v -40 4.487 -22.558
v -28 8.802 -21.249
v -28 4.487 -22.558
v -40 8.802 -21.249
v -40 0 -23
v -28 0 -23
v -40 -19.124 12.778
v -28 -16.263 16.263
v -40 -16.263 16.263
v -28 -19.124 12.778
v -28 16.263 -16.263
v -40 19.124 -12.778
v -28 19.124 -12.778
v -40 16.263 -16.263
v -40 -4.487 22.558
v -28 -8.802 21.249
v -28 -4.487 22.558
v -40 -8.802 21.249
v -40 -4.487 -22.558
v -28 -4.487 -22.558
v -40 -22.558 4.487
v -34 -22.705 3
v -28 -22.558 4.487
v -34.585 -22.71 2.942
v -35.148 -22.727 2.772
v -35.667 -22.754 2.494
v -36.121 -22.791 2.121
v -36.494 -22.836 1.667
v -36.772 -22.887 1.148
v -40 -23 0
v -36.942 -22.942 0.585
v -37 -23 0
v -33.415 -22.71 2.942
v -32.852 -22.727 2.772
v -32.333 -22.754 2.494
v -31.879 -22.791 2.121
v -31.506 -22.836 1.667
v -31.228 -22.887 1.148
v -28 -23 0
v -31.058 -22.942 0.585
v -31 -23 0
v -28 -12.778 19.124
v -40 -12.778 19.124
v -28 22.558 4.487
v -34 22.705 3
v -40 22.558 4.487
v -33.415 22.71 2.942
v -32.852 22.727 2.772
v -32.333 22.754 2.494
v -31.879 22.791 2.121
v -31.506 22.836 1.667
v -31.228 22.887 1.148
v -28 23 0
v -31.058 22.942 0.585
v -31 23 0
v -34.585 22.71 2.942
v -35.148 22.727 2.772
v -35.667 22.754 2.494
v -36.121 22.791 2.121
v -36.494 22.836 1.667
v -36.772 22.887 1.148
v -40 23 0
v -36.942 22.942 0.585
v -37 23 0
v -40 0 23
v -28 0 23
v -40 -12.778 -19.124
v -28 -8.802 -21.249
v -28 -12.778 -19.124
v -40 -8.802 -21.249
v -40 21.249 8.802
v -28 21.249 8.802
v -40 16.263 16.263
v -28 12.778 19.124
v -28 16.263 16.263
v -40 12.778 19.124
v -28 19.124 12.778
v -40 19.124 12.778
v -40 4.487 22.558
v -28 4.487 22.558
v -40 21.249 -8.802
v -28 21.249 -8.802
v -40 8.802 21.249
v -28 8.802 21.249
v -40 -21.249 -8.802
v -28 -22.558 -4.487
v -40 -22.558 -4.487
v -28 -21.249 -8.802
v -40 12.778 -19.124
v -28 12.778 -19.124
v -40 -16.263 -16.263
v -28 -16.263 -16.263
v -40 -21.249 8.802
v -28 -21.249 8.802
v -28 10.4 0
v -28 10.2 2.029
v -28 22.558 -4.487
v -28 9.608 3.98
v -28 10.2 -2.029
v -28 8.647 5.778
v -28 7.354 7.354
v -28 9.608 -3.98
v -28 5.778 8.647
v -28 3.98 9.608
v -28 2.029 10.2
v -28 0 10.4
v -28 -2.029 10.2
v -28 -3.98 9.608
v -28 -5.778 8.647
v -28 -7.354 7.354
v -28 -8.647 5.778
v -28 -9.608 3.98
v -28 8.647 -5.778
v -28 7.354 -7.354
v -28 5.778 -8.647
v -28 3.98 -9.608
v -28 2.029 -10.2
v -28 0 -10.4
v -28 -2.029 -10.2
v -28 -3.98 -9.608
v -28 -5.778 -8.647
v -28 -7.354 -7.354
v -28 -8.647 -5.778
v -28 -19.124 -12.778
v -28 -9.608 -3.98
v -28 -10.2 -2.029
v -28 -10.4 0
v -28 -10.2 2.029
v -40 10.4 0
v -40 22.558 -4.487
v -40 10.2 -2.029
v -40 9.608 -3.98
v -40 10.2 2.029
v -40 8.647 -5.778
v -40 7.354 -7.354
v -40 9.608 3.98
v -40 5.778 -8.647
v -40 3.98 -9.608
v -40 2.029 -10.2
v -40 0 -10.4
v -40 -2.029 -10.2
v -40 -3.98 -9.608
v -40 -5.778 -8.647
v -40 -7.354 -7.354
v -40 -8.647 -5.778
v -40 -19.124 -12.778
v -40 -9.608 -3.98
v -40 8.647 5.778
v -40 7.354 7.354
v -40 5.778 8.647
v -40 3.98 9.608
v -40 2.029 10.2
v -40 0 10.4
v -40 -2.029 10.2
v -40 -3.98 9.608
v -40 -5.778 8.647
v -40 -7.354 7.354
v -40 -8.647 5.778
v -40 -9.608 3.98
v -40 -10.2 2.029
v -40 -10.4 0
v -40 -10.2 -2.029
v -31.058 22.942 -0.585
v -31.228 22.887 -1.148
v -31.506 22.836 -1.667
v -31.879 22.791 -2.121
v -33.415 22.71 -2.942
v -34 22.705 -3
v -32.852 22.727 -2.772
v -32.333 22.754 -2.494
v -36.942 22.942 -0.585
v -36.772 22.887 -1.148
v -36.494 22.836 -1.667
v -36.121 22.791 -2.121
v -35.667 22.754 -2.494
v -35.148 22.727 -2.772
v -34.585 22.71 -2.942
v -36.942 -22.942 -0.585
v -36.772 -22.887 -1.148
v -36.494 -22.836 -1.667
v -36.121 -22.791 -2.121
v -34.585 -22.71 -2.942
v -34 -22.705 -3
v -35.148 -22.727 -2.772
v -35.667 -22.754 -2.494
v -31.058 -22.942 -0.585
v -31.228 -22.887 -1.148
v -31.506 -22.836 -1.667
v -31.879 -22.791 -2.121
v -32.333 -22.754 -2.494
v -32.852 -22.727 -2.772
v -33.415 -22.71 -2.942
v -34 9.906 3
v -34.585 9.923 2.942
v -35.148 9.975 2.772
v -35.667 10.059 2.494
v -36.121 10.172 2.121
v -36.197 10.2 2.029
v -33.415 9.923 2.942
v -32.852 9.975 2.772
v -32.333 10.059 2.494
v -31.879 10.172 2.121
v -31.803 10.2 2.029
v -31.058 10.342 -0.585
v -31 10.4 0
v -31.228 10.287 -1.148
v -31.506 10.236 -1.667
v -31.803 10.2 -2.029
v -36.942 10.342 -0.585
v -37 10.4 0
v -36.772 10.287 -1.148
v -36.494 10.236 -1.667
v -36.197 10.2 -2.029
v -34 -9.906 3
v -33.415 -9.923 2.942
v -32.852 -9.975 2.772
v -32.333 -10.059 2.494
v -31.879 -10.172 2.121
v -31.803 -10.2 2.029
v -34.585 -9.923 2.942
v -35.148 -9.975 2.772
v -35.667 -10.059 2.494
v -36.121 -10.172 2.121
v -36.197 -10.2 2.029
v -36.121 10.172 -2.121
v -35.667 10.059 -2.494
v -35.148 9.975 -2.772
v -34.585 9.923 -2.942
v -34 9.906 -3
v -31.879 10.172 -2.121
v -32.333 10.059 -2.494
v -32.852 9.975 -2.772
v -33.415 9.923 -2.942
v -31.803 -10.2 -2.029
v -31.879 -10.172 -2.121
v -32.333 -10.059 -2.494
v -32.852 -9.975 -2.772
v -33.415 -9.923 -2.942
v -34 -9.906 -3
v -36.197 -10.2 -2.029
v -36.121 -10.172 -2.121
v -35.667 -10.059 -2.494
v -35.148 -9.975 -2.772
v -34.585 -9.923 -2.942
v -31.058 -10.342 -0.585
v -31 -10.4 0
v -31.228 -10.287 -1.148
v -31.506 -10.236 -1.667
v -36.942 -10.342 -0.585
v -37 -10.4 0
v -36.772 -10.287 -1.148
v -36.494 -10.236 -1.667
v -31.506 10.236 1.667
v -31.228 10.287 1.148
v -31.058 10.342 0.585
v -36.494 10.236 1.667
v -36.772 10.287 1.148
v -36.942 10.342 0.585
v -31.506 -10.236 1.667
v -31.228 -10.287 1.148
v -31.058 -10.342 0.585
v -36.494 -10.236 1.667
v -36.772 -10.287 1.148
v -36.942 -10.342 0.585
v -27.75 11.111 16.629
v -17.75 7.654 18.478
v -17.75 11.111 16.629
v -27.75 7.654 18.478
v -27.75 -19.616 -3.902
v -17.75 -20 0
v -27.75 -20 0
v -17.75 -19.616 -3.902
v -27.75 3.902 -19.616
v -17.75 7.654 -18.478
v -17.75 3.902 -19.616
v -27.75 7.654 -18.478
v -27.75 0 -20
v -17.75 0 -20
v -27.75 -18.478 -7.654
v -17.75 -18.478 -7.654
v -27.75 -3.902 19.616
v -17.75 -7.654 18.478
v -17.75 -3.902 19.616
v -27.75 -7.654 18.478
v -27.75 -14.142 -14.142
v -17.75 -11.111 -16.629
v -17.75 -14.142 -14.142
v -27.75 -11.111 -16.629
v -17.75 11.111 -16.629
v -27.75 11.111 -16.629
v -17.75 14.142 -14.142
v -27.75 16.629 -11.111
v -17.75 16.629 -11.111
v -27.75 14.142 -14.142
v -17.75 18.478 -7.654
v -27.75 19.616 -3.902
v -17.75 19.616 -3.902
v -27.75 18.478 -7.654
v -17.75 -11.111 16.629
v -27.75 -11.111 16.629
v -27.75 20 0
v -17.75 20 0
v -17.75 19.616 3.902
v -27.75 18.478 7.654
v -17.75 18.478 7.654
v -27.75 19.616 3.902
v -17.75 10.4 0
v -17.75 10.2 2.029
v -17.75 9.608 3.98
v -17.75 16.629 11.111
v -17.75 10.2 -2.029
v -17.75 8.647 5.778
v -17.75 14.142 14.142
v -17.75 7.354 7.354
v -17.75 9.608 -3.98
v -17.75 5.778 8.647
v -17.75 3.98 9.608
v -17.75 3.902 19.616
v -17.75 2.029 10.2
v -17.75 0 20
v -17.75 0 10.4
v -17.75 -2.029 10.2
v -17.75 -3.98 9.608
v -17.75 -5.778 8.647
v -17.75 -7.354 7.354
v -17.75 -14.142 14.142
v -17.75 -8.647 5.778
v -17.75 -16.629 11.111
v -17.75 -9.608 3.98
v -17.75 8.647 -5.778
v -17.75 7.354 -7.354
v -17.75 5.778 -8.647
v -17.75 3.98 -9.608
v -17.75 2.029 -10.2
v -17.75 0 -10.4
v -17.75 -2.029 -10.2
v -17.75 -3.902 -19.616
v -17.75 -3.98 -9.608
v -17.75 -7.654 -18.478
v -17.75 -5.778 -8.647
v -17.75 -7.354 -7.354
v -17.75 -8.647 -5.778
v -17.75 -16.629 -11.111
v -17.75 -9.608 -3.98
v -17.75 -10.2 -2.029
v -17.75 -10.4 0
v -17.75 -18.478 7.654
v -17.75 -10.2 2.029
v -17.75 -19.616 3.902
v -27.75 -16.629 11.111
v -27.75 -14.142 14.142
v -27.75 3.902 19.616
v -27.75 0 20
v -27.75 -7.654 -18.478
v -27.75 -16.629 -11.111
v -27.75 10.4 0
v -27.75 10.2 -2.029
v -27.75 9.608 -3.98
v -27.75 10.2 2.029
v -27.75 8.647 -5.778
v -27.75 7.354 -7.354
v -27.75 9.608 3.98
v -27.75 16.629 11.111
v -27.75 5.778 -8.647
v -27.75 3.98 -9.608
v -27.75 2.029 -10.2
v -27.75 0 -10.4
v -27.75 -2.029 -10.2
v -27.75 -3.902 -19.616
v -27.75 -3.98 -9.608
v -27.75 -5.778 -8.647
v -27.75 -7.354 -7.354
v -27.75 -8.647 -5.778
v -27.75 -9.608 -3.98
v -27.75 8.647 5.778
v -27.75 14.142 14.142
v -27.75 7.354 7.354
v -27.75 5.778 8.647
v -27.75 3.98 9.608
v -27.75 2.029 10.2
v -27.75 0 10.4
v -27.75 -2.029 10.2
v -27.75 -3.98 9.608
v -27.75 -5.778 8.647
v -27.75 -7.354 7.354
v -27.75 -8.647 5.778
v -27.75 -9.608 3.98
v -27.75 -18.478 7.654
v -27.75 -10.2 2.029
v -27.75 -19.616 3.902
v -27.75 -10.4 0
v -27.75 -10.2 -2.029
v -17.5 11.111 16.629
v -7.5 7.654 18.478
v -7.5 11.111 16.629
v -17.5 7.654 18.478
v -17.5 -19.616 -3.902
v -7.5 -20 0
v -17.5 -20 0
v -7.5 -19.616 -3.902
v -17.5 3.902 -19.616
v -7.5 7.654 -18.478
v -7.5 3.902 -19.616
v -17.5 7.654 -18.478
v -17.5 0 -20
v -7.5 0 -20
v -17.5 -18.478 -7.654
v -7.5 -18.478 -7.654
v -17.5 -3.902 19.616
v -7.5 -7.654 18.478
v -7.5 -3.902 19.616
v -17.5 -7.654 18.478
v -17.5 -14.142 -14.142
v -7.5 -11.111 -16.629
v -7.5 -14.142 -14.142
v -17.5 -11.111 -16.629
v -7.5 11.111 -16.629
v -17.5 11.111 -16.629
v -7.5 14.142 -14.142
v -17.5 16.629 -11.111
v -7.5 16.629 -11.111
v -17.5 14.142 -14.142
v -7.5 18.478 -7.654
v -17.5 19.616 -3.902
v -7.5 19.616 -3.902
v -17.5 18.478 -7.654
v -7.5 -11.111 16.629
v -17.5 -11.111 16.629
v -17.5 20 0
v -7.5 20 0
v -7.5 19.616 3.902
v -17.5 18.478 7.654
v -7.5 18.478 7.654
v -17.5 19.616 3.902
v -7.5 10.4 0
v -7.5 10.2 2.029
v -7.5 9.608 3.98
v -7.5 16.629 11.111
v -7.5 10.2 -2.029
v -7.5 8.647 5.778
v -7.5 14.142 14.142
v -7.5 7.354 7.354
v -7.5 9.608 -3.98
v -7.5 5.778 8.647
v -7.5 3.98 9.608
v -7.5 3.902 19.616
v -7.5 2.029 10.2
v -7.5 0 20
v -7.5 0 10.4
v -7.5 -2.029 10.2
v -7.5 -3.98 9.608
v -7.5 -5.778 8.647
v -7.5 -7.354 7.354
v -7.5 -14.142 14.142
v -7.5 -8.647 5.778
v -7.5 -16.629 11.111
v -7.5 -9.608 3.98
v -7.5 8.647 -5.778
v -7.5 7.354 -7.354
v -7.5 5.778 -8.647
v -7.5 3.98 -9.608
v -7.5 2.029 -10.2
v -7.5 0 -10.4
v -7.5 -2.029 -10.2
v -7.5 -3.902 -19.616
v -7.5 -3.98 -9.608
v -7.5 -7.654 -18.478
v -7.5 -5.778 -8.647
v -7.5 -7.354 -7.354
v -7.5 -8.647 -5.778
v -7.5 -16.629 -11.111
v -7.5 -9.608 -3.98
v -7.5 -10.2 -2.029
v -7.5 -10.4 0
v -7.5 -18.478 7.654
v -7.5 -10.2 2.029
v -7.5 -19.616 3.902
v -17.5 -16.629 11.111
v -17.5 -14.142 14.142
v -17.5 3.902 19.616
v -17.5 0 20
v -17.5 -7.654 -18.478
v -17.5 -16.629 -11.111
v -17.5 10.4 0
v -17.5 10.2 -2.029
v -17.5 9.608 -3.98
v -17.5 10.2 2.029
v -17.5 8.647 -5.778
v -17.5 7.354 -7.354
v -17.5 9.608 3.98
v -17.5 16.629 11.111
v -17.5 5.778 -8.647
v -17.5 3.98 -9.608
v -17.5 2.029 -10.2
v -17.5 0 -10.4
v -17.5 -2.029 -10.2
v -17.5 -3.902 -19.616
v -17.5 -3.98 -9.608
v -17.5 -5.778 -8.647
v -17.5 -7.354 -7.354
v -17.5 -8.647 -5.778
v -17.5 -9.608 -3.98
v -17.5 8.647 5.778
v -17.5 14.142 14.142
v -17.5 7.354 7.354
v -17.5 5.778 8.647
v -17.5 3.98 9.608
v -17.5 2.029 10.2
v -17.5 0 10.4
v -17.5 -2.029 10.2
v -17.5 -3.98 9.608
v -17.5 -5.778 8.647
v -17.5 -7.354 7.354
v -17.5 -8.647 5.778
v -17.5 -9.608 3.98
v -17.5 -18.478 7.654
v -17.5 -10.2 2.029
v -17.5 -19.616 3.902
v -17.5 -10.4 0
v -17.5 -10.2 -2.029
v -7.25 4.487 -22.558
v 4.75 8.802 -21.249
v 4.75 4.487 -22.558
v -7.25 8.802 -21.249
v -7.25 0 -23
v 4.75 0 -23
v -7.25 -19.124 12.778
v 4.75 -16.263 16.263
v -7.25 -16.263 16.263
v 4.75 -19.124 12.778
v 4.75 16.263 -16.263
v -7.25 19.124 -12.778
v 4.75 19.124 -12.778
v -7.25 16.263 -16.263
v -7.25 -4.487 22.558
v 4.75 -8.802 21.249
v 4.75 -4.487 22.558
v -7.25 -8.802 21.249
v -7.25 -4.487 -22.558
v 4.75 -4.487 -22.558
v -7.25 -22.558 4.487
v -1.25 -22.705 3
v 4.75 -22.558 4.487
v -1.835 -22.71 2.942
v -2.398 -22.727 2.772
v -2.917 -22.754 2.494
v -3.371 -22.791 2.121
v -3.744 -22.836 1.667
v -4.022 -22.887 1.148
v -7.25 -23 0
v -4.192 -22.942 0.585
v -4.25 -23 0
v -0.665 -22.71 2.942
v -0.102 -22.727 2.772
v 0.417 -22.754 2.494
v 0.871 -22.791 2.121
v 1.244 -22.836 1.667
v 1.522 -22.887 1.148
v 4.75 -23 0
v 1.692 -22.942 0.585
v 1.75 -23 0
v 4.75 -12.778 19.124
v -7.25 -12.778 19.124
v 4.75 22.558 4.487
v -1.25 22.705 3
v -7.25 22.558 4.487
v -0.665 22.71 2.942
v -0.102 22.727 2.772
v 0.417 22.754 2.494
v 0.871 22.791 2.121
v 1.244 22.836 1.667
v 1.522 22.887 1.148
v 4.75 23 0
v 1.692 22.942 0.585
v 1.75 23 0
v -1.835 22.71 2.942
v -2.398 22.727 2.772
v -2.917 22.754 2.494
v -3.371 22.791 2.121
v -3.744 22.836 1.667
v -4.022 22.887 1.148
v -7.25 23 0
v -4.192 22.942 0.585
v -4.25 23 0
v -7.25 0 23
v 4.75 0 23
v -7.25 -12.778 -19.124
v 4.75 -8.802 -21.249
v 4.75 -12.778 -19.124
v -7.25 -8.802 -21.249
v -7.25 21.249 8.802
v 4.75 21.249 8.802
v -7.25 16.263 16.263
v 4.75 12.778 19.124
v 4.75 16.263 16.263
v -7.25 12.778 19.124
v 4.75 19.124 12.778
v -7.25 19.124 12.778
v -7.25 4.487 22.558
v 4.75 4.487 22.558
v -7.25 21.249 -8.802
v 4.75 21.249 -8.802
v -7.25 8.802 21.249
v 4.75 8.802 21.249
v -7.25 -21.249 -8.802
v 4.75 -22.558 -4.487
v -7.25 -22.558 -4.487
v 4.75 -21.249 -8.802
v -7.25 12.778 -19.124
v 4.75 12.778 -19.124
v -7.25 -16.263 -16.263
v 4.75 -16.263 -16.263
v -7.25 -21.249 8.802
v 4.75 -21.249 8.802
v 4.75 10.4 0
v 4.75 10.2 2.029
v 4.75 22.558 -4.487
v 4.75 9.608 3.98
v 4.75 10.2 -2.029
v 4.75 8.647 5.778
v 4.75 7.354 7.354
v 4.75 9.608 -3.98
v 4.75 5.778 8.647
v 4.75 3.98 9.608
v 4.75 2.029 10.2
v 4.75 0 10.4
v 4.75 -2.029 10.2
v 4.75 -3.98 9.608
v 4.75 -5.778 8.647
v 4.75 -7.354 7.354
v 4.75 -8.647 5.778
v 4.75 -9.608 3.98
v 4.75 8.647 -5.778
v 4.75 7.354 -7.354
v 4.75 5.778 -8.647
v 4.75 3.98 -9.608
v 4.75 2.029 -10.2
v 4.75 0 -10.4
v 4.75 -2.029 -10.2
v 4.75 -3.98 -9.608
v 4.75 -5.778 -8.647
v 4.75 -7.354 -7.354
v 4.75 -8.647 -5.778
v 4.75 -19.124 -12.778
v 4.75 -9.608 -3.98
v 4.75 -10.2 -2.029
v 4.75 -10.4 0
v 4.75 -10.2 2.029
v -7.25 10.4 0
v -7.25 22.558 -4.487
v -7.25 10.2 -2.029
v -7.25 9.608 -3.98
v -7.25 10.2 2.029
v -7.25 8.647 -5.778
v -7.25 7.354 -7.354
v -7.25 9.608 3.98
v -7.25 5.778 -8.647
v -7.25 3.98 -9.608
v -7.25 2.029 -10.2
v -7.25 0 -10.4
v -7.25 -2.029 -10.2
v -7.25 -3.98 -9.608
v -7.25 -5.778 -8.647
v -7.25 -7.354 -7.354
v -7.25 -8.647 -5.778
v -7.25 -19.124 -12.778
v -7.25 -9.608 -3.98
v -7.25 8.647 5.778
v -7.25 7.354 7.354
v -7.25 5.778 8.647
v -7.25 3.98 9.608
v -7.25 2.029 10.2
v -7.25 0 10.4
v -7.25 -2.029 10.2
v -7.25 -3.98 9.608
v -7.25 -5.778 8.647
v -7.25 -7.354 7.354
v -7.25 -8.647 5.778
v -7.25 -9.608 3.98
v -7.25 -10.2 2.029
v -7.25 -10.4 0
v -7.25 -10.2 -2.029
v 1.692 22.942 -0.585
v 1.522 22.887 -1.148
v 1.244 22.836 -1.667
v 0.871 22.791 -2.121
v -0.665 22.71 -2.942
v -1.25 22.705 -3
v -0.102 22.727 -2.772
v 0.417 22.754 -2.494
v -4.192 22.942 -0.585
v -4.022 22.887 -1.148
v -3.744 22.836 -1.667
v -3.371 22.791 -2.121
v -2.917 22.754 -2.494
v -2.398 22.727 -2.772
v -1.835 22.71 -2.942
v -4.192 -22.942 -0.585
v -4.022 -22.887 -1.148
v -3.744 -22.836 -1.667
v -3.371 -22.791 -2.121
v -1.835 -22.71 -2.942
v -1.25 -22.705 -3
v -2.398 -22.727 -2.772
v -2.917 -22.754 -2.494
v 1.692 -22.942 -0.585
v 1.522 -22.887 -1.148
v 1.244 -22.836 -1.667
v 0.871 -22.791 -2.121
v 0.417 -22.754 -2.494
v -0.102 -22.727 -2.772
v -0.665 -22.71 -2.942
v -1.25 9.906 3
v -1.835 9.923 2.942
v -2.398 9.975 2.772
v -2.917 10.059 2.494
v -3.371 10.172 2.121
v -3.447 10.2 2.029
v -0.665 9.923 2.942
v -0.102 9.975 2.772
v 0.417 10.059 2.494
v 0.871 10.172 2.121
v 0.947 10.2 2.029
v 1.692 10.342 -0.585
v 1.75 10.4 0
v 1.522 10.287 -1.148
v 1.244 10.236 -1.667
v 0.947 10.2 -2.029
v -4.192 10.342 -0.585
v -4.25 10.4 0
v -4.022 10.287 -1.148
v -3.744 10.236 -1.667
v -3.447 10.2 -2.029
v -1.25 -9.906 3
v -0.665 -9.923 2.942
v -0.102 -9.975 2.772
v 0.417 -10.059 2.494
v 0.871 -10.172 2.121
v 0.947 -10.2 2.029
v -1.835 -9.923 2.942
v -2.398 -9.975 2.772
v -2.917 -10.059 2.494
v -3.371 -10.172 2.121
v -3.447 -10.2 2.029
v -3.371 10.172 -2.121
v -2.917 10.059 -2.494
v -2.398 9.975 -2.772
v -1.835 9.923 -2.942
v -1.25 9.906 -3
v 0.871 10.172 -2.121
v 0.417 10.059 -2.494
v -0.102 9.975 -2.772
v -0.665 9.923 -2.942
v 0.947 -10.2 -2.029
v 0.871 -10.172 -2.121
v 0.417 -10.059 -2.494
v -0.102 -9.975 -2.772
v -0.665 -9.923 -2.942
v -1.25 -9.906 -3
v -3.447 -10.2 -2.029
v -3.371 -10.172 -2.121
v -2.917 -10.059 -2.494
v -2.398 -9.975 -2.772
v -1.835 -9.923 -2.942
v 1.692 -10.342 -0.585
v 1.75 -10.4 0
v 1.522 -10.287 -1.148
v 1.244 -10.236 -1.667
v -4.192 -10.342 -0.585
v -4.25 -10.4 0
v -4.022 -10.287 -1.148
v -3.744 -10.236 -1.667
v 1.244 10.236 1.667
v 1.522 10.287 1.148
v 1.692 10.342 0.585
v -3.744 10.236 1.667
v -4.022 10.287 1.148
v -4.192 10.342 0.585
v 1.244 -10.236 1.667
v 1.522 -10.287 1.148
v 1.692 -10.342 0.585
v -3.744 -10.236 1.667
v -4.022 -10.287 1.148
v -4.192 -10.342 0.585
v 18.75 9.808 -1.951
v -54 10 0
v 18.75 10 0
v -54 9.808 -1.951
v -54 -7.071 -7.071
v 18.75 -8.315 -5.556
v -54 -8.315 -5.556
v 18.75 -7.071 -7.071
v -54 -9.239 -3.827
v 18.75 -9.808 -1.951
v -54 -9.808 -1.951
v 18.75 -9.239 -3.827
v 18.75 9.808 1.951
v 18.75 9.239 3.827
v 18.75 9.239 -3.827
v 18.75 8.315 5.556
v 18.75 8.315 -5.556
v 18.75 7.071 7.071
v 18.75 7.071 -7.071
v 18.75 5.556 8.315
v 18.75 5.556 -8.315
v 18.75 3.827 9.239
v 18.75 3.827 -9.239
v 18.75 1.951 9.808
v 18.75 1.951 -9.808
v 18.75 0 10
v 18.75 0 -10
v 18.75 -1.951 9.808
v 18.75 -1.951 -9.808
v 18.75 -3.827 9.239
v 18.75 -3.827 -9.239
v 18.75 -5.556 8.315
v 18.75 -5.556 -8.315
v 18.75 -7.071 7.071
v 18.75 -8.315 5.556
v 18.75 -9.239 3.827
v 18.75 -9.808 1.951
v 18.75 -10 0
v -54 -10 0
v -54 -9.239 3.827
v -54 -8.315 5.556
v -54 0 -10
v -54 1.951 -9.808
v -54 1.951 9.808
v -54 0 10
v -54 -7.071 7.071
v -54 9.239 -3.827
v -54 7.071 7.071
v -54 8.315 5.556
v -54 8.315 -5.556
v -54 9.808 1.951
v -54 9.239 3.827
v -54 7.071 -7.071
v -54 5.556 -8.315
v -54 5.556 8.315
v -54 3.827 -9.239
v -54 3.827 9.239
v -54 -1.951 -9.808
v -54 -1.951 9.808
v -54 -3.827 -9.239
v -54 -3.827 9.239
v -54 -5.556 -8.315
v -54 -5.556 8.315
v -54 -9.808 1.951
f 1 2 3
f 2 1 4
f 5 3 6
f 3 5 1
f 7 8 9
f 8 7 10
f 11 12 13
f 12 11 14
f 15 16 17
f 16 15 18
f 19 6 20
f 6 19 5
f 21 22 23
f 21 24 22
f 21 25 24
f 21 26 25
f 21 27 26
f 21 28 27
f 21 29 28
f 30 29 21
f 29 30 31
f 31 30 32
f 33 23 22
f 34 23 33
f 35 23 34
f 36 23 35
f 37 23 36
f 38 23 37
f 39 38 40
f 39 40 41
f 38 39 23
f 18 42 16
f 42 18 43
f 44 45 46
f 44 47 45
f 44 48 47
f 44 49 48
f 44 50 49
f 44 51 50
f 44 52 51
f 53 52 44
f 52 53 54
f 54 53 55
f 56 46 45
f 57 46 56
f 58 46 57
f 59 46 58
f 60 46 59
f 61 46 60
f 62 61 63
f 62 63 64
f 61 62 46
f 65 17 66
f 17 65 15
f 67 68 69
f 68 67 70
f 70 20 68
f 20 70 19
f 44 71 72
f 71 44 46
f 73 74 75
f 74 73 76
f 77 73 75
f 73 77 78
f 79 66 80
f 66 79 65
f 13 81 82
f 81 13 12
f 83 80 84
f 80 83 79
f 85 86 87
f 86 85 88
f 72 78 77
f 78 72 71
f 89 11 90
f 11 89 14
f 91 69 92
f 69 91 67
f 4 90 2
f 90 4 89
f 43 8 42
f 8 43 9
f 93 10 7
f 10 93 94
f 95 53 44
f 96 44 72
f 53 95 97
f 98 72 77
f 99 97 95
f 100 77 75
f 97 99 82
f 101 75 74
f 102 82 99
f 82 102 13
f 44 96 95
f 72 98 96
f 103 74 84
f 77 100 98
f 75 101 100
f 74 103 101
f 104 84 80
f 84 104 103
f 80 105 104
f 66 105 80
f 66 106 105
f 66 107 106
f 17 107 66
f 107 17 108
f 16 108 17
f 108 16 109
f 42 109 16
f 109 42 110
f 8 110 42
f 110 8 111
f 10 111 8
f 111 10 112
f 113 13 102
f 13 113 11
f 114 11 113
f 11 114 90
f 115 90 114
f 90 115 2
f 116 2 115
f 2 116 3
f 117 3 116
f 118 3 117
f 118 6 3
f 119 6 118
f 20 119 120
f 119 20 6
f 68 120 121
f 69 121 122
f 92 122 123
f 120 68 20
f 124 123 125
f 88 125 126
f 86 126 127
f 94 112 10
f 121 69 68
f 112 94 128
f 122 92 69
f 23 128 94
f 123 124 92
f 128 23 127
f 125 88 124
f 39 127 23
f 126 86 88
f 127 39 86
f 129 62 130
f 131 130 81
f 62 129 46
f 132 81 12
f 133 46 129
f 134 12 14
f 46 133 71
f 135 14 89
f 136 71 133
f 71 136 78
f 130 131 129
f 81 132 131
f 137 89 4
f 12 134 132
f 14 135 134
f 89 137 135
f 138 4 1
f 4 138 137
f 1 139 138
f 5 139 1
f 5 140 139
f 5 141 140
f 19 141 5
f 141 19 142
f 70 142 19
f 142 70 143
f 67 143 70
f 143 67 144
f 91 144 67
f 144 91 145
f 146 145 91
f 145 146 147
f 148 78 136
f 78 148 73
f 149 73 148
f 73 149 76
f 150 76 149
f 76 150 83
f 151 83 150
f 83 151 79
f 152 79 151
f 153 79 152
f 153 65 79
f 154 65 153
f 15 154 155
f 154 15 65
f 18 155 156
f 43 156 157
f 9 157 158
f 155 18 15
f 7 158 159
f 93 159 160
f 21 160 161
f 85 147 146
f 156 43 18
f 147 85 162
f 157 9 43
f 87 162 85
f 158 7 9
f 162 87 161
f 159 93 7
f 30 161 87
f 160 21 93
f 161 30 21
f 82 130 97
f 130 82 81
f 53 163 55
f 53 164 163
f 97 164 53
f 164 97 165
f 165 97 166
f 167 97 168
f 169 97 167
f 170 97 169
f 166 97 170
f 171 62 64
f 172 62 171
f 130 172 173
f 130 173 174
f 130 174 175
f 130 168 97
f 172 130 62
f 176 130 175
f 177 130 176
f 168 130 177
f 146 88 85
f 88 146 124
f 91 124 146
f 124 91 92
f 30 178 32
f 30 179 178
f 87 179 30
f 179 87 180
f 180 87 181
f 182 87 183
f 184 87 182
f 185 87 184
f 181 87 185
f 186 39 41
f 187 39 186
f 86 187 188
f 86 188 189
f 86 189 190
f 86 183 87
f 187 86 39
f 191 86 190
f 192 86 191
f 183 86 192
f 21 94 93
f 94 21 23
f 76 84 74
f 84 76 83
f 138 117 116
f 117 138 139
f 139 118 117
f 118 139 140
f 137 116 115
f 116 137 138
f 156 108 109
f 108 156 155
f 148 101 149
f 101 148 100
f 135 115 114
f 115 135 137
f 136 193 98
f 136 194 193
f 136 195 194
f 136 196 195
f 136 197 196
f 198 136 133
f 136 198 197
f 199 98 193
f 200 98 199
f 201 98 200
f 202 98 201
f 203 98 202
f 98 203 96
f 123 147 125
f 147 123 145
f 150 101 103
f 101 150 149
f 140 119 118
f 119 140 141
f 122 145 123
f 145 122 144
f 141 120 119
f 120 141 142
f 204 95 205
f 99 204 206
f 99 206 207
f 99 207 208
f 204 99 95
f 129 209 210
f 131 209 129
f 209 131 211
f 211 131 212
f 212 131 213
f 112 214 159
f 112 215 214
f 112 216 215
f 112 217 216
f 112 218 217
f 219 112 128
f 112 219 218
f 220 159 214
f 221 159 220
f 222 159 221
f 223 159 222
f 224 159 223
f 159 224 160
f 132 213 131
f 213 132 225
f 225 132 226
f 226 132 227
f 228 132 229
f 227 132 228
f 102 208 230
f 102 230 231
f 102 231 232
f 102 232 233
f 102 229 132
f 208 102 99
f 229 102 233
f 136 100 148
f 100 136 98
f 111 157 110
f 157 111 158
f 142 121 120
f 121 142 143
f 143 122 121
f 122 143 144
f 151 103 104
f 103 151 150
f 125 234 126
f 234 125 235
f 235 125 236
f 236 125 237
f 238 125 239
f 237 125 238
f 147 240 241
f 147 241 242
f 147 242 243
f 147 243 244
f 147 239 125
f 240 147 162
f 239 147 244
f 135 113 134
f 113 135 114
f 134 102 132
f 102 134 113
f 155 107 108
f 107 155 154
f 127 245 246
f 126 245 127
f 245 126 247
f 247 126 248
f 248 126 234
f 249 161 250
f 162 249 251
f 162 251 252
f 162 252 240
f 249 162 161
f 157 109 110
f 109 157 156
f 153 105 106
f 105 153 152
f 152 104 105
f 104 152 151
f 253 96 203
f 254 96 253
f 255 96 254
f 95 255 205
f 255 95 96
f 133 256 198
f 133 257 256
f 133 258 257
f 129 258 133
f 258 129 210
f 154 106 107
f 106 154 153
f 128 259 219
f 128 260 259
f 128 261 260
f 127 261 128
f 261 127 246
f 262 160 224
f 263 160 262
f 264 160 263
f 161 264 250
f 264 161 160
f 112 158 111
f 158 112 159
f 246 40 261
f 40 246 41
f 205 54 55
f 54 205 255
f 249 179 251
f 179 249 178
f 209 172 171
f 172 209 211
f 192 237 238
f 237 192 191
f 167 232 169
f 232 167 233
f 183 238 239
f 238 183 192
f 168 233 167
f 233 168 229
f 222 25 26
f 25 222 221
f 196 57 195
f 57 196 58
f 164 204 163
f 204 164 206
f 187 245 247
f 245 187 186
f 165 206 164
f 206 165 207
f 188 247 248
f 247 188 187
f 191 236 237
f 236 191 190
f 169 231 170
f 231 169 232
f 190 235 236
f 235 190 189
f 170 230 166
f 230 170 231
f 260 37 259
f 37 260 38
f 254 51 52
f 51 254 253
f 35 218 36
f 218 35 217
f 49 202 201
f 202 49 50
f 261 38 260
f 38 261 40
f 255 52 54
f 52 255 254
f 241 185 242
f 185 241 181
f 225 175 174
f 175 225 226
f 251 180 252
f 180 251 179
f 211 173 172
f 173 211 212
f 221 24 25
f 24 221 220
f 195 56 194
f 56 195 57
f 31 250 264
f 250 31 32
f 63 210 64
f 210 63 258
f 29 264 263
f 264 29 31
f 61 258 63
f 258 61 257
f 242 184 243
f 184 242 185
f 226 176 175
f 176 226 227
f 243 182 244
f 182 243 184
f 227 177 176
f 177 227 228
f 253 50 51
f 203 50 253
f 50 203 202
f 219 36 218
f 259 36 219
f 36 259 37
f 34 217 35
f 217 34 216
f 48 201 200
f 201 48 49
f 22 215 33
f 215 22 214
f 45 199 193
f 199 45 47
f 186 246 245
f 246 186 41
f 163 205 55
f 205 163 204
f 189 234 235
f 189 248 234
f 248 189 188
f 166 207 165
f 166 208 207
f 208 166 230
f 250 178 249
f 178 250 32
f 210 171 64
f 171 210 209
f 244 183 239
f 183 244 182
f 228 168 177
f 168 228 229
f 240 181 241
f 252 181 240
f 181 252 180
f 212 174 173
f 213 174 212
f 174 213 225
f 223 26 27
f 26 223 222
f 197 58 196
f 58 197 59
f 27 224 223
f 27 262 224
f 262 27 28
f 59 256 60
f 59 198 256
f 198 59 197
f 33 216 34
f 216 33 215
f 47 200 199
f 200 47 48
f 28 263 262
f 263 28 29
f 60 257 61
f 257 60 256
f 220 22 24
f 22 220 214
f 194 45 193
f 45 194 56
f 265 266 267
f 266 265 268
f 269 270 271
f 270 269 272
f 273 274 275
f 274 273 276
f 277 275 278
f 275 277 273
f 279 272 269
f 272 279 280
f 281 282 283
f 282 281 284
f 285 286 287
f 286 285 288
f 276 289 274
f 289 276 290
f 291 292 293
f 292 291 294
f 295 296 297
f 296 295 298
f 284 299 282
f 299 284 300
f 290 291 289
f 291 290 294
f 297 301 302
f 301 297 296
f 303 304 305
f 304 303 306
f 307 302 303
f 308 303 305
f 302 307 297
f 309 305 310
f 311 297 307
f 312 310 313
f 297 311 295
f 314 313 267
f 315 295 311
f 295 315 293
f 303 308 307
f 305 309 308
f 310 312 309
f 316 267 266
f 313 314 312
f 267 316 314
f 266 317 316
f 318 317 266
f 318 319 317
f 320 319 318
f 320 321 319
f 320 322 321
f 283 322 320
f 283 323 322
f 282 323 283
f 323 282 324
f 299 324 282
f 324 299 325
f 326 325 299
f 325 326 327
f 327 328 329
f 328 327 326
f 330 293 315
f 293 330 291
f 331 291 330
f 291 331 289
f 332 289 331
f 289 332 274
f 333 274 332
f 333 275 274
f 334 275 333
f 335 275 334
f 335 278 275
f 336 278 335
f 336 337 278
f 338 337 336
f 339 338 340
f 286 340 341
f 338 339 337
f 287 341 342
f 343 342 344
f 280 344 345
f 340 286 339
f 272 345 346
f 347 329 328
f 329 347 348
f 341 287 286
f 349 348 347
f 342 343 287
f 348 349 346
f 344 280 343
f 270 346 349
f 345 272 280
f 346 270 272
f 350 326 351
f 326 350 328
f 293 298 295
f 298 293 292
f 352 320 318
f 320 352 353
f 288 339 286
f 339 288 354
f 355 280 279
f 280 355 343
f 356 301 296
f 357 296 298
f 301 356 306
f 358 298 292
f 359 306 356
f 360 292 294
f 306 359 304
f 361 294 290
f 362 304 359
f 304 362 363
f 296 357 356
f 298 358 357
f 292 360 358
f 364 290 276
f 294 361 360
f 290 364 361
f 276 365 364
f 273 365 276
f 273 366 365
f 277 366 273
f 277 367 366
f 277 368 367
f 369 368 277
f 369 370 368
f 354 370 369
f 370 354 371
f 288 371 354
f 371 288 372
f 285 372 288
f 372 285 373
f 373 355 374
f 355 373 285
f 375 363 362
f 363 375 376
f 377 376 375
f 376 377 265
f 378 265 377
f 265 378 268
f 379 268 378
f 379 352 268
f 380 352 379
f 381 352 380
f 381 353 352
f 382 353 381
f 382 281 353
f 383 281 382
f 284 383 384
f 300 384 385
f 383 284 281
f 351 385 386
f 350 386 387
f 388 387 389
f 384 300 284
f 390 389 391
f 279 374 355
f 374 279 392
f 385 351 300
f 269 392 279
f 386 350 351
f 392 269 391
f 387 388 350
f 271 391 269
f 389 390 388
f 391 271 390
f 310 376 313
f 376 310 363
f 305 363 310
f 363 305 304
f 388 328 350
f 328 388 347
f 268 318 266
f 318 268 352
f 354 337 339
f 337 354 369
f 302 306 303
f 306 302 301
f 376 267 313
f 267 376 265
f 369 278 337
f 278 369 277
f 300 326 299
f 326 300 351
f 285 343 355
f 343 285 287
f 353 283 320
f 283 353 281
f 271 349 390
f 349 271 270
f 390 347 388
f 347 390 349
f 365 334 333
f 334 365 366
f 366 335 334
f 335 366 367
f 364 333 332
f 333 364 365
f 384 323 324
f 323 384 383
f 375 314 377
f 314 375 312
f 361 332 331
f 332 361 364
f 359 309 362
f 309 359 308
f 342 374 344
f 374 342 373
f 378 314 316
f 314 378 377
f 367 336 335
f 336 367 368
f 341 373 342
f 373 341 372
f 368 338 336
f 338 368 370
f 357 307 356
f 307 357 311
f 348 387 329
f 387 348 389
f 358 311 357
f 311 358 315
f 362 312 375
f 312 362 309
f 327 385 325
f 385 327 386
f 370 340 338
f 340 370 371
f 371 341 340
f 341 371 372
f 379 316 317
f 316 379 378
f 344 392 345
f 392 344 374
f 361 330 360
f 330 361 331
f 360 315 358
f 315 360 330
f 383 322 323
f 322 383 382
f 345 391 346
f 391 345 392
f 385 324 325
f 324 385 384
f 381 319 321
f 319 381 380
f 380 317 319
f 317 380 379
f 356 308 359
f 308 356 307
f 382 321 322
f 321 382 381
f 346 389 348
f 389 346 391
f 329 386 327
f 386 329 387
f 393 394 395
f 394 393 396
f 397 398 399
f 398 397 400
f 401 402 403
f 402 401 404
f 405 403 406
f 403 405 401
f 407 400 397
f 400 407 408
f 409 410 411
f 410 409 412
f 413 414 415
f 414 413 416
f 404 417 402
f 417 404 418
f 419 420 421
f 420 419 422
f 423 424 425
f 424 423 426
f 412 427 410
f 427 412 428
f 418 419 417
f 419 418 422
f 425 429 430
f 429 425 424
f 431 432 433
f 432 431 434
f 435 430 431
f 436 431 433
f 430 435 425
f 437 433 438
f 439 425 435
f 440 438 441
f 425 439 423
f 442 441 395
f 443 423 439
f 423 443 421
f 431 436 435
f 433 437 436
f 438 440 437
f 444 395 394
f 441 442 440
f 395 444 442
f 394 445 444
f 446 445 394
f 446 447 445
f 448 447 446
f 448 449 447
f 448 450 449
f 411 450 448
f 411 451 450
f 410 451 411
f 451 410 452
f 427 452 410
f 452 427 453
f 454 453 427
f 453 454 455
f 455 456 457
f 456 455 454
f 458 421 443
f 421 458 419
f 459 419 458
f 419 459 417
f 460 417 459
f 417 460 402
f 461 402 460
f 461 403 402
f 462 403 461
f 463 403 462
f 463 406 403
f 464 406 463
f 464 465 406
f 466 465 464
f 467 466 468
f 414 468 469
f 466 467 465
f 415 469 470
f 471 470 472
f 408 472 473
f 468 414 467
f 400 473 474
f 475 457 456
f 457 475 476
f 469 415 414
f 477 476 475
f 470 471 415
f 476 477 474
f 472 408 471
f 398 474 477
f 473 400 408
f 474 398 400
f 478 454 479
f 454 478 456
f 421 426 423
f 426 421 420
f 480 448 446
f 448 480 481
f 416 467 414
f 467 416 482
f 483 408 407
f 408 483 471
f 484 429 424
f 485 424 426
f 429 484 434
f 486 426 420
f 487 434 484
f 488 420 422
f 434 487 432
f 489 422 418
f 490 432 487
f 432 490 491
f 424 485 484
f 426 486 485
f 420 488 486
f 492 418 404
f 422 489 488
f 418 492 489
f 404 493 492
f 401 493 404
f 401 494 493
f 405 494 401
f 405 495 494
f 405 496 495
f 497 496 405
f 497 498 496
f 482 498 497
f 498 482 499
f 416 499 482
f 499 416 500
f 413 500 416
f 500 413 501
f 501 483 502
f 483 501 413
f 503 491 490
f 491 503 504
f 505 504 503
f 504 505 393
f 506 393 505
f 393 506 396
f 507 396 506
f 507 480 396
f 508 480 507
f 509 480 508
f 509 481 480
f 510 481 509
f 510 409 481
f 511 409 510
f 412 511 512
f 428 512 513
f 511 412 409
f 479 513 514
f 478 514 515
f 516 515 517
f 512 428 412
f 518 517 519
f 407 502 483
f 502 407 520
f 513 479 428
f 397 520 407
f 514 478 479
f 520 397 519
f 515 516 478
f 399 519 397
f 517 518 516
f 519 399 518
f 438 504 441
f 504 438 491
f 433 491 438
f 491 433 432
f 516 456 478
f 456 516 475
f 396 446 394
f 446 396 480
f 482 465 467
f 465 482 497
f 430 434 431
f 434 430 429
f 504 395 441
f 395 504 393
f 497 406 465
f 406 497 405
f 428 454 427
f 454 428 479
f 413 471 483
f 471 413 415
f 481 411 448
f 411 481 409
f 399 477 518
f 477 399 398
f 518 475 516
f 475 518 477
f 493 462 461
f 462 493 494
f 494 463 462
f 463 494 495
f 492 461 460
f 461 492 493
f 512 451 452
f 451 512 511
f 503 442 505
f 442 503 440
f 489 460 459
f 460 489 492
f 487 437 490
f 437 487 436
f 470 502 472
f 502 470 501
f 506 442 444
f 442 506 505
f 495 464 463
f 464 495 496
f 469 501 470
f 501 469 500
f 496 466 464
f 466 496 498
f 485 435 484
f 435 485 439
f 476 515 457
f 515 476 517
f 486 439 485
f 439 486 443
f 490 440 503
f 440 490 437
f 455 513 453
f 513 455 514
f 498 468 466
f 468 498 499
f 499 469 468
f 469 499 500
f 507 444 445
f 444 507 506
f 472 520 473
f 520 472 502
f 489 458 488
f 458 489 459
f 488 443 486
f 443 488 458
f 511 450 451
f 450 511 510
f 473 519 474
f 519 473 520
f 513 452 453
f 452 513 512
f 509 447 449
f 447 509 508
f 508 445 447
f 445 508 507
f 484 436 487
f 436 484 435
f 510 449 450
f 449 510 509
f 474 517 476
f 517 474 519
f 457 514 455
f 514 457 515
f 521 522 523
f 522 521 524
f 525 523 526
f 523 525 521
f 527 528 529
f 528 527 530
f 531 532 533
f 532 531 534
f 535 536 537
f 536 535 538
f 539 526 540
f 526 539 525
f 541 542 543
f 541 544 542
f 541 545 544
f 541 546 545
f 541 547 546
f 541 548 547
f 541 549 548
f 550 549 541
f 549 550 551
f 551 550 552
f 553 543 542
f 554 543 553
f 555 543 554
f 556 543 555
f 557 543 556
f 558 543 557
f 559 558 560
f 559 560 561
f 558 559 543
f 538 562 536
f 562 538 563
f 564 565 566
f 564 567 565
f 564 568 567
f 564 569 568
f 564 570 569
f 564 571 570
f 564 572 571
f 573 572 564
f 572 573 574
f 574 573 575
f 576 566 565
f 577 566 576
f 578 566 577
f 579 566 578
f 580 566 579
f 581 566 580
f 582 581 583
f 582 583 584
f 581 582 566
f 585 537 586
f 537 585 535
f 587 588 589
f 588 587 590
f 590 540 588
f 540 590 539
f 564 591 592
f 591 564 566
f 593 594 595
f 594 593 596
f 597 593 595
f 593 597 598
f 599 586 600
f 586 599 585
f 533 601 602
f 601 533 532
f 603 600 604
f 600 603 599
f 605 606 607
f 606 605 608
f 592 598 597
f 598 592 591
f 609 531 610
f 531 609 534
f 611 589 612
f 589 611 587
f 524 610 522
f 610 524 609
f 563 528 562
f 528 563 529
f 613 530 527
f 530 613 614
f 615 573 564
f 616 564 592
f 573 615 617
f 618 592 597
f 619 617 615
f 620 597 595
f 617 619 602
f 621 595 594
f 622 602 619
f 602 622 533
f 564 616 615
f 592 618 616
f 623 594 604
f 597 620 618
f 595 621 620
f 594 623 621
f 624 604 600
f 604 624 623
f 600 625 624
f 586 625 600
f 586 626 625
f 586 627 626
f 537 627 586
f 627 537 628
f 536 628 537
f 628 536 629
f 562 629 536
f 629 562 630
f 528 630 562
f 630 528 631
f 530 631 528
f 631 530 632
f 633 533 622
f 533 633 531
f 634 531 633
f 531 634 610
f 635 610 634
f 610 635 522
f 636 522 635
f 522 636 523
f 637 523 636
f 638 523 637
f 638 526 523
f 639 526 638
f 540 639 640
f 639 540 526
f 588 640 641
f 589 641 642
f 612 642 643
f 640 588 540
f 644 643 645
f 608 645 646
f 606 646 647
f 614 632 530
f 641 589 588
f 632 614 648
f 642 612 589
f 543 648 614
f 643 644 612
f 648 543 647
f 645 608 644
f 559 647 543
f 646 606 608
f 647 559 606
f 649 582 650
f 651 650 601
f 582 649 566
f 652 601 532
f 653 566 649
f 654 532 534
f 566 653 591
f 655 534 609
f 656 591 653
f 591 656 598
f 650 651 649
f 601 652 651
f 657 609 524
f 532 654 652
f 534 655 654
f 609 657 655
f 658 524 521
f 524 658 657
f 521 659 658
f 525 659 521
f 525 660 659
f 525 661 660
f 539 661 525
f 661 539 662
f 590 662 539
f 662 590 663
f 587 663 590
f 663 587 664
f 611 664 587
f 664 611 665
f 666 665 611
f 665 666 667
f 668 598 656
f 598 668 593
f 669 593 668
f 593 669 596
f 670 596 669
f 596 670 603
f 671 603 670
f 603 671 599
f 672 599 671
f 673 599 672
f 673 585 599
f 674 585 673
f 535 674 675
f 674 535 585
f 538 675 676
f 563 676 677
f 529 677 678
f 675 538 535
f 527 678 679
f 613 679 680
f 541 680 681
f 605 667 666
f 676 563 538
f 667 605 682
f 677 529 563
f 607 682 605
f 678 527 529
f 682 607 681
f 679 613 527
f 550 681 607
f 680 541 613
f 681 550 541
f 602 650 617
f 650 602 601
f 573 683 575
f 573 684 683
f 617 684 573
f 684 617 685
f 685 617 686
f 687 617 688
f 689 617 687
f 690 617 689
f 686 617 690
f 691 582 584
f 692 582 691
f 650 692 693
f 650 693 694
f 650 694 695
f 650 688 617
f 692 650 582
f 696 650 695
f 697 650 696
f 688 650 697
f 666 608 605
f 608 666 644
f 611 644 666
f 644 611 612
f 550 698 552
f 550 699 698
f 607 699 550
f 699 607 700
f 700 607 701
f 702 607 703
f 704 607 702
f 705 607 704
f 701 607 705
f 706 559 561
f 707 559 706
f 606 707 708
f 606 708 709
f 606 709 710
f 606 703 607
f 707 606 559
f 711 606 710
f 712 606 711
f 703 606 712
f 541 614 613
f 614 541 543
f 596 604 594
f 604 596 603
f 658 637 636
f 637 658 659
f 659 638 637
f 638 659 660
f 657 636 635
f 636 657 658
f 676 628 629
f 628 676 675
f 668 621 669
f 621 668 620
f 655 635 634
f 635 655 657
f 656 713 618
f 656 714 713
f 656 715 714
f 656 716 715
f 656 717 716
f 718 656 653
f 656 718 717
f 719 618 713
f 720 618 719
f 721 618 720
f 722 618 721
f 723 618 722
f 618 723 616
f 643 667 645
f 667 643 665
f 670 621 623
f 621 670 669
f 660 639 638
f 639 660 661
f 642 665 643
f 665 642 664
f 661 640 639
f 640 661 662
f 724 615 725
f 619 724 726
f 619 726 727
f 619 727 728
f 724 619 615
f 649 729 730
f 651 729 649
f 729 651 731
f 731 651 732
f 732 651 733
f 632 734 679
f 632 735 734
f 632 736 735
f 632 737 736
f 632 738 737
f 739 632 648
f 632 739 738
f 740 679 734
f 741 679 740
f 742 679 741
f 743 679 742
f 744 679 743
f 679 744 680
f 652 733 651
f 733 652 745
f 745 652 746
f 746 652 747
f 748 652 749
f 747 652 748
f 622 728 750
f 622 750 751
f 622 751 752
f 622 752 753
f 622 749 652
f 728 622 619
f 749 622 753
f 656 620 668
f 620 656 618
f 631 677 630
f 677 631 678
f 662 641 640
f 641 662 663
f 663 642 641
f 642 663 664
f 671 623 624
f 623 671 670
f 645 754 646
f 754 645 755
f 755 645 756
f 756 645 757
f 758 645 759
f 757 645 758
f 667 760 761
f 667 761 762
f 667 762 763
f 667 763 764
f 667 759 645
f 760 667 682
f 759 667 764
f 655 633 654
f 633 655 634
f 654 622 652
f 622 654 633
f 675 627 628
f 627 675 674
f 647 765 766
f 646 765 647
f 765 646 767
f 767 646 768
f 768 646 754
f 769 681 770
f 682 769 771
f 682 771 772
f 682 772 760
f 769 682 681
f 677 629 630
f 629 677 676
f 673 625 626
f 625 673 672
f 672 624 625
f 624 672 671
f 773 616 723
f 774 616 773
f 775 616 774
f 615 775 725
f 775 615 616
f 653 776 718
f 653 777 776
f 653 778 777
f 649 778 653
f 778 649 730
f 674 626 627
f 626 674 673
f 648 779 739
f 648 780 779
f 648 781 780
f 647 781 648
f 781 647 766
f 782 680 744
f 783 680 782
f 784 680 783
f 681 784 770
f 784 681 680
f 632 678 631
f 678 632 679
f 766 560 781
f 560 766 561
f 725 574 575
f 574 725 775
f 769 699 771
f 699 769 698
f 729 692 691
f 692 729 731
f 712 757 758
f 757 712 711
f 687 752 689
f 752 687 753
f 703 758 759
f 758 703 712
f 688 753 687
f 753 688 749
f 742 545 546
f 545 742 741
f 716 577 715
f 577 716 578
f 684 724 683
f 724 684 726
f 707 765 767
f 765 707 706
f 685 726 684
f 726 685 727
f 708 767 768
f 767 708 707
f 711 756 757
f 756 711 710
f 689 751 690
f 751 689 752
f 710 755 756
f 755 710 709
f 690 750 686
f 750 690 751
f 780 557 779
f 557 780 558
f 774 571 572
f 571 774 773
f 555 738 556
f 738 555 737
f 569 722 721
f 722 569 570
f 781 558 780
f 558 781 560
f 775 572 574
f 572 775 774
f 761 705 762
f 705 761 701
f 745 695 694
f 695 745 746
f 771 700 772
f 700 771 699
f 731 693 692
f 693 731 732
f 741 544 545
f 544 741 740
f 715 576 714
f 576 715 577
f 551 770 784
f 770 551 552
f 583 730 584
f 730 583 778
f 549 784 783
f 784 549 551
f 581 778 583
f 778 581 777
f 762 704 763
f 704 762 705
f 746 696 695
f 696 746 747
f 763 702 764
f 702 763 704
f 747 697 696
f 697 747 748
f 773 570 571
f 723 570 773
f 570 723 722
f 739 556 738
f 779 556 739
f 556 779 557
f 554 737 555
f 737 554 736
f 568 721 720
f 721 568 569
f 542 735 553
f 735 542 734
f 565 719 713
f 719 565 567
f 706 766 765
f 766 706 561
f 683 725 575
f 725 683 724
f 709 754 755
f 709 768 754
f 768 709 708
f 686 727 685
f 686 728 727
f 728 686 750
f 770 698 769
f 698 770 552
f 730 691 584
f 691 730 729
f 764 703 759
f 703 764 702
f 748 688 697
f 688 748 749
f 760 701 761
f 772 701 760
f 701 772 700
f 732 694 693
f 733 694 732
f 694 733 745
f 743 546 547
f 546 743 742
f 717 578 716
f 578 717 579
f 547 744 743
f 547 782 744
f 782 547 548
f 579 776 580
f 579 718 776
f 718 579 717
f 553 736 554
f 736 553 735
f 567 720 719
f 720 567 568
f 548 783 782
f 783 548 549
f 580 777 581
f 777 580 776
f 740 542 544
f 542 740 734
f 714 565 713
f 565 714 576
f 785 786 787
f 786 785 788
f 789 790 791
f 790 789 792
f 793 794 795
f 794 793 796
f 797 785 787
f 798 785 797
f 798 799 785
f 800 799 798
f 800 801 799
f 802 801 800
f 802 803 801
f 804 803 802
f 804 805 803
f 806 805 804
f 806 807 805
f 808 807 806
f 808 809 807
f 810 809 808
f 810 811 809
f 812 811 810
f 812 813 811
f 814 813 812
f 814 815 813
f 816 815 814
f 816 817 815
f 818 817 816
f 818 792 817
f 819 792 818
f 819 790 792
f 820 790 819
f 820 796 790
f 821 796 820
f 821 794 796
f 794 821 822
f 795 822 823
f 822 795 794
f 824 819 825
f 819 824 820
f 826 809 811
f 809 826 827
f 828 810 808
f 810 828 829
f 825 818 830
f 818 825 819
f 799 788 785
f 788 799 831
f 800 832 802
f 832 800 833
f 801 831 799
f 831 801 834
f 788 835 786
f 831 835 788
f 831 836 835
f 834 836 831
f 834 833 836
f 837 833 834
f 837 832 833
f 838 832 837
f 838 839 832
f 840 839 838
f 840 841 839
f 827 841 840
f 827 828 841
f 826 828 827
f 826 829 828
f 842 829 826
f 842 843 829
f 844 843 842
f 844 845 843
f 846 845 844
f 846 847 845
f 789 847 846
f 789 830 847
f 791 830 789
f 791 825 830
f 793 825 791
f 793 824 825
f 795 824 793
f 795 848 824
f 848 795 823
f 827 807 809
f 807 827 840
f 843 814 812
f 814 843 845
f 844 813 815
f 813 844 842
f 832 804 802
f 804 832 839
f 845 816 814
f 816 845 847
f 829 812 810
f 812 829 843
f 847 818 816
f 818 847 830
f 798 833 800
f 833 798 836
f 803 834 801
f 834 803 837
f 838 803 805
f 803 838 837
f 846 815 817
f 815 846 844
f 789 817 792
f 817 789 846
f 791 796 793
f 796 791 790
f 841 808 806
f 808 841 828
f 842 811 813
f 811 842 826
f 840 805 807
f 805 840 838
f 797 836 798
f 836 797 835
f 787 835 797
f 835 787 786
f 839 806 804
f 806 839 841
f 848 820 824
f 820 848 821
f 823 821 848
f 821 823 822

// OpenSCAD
$fn = 32;

// ------------------------------------------------------------------------
// Shaft with rings and collars: d20 shaft, 4 rings
// Every part is its own module, assembly() places them once.
// ------------------------------------------------------------------------

// --- part 1 ---
module shaft() {
  translate([0, 0, -36.375]) cylinder(h = 72.75, d = 20);
}

// --- part 2 ---
module collar_a() {
  difference() {
    cylinder(h = 12, d = 46);
    translate([0, 0, -1]) cylinder(h = 14, d = 20.8);
    translate([0, 0, 6]) rotate([90, 0, 0]) cylinder(h = 48, d = 6, center = true);
  }
}

// --- part 3 ---
module spacer_a() {
  difference() {
      translate([0, 0, 0]) cylinder(h = 10, d = 40);
      translate([0, 0, -1]) cylinder(h = 12, d = 20.8);
    }
}

// --- part 4 ---
module spacer_b() {
  difference() {
      translate([0, 0, 0]) cylinder(h = 10, d = 40);
      translate([0, 0, -1]) cylinder(h = 12, d = 20.8);
    }
}

// --- part 5 ---
module collar_b() {
  difference() {
    cylinder(h = 12, d = 46);
    translate([0, 0, -1]) cylinder(h = 14, d = 20.8);
    translate([0, 0, 6]) rotate([90, 0, 0]) cylinder(h = 48, d = 6, center = true);
  }
}

// --- assembly ---
module assembly() {
  translate([-17.625, 0, 0]) rotate([0, 90, 0]) shaft();
  translate([-40, 0, 0]) rotate([0, 90, 0]) collar_a();
  translate([-27.75, 0, 0]) rotate([0, 90, 0]) spacer_a();
  translate([-17.5, 0, 0]) rotate([0, 90, 0]) spacer_b();
  translate([-7.25, 0, 0]) rotate([0, 90, 0]) collar_b();
}

assembly();
